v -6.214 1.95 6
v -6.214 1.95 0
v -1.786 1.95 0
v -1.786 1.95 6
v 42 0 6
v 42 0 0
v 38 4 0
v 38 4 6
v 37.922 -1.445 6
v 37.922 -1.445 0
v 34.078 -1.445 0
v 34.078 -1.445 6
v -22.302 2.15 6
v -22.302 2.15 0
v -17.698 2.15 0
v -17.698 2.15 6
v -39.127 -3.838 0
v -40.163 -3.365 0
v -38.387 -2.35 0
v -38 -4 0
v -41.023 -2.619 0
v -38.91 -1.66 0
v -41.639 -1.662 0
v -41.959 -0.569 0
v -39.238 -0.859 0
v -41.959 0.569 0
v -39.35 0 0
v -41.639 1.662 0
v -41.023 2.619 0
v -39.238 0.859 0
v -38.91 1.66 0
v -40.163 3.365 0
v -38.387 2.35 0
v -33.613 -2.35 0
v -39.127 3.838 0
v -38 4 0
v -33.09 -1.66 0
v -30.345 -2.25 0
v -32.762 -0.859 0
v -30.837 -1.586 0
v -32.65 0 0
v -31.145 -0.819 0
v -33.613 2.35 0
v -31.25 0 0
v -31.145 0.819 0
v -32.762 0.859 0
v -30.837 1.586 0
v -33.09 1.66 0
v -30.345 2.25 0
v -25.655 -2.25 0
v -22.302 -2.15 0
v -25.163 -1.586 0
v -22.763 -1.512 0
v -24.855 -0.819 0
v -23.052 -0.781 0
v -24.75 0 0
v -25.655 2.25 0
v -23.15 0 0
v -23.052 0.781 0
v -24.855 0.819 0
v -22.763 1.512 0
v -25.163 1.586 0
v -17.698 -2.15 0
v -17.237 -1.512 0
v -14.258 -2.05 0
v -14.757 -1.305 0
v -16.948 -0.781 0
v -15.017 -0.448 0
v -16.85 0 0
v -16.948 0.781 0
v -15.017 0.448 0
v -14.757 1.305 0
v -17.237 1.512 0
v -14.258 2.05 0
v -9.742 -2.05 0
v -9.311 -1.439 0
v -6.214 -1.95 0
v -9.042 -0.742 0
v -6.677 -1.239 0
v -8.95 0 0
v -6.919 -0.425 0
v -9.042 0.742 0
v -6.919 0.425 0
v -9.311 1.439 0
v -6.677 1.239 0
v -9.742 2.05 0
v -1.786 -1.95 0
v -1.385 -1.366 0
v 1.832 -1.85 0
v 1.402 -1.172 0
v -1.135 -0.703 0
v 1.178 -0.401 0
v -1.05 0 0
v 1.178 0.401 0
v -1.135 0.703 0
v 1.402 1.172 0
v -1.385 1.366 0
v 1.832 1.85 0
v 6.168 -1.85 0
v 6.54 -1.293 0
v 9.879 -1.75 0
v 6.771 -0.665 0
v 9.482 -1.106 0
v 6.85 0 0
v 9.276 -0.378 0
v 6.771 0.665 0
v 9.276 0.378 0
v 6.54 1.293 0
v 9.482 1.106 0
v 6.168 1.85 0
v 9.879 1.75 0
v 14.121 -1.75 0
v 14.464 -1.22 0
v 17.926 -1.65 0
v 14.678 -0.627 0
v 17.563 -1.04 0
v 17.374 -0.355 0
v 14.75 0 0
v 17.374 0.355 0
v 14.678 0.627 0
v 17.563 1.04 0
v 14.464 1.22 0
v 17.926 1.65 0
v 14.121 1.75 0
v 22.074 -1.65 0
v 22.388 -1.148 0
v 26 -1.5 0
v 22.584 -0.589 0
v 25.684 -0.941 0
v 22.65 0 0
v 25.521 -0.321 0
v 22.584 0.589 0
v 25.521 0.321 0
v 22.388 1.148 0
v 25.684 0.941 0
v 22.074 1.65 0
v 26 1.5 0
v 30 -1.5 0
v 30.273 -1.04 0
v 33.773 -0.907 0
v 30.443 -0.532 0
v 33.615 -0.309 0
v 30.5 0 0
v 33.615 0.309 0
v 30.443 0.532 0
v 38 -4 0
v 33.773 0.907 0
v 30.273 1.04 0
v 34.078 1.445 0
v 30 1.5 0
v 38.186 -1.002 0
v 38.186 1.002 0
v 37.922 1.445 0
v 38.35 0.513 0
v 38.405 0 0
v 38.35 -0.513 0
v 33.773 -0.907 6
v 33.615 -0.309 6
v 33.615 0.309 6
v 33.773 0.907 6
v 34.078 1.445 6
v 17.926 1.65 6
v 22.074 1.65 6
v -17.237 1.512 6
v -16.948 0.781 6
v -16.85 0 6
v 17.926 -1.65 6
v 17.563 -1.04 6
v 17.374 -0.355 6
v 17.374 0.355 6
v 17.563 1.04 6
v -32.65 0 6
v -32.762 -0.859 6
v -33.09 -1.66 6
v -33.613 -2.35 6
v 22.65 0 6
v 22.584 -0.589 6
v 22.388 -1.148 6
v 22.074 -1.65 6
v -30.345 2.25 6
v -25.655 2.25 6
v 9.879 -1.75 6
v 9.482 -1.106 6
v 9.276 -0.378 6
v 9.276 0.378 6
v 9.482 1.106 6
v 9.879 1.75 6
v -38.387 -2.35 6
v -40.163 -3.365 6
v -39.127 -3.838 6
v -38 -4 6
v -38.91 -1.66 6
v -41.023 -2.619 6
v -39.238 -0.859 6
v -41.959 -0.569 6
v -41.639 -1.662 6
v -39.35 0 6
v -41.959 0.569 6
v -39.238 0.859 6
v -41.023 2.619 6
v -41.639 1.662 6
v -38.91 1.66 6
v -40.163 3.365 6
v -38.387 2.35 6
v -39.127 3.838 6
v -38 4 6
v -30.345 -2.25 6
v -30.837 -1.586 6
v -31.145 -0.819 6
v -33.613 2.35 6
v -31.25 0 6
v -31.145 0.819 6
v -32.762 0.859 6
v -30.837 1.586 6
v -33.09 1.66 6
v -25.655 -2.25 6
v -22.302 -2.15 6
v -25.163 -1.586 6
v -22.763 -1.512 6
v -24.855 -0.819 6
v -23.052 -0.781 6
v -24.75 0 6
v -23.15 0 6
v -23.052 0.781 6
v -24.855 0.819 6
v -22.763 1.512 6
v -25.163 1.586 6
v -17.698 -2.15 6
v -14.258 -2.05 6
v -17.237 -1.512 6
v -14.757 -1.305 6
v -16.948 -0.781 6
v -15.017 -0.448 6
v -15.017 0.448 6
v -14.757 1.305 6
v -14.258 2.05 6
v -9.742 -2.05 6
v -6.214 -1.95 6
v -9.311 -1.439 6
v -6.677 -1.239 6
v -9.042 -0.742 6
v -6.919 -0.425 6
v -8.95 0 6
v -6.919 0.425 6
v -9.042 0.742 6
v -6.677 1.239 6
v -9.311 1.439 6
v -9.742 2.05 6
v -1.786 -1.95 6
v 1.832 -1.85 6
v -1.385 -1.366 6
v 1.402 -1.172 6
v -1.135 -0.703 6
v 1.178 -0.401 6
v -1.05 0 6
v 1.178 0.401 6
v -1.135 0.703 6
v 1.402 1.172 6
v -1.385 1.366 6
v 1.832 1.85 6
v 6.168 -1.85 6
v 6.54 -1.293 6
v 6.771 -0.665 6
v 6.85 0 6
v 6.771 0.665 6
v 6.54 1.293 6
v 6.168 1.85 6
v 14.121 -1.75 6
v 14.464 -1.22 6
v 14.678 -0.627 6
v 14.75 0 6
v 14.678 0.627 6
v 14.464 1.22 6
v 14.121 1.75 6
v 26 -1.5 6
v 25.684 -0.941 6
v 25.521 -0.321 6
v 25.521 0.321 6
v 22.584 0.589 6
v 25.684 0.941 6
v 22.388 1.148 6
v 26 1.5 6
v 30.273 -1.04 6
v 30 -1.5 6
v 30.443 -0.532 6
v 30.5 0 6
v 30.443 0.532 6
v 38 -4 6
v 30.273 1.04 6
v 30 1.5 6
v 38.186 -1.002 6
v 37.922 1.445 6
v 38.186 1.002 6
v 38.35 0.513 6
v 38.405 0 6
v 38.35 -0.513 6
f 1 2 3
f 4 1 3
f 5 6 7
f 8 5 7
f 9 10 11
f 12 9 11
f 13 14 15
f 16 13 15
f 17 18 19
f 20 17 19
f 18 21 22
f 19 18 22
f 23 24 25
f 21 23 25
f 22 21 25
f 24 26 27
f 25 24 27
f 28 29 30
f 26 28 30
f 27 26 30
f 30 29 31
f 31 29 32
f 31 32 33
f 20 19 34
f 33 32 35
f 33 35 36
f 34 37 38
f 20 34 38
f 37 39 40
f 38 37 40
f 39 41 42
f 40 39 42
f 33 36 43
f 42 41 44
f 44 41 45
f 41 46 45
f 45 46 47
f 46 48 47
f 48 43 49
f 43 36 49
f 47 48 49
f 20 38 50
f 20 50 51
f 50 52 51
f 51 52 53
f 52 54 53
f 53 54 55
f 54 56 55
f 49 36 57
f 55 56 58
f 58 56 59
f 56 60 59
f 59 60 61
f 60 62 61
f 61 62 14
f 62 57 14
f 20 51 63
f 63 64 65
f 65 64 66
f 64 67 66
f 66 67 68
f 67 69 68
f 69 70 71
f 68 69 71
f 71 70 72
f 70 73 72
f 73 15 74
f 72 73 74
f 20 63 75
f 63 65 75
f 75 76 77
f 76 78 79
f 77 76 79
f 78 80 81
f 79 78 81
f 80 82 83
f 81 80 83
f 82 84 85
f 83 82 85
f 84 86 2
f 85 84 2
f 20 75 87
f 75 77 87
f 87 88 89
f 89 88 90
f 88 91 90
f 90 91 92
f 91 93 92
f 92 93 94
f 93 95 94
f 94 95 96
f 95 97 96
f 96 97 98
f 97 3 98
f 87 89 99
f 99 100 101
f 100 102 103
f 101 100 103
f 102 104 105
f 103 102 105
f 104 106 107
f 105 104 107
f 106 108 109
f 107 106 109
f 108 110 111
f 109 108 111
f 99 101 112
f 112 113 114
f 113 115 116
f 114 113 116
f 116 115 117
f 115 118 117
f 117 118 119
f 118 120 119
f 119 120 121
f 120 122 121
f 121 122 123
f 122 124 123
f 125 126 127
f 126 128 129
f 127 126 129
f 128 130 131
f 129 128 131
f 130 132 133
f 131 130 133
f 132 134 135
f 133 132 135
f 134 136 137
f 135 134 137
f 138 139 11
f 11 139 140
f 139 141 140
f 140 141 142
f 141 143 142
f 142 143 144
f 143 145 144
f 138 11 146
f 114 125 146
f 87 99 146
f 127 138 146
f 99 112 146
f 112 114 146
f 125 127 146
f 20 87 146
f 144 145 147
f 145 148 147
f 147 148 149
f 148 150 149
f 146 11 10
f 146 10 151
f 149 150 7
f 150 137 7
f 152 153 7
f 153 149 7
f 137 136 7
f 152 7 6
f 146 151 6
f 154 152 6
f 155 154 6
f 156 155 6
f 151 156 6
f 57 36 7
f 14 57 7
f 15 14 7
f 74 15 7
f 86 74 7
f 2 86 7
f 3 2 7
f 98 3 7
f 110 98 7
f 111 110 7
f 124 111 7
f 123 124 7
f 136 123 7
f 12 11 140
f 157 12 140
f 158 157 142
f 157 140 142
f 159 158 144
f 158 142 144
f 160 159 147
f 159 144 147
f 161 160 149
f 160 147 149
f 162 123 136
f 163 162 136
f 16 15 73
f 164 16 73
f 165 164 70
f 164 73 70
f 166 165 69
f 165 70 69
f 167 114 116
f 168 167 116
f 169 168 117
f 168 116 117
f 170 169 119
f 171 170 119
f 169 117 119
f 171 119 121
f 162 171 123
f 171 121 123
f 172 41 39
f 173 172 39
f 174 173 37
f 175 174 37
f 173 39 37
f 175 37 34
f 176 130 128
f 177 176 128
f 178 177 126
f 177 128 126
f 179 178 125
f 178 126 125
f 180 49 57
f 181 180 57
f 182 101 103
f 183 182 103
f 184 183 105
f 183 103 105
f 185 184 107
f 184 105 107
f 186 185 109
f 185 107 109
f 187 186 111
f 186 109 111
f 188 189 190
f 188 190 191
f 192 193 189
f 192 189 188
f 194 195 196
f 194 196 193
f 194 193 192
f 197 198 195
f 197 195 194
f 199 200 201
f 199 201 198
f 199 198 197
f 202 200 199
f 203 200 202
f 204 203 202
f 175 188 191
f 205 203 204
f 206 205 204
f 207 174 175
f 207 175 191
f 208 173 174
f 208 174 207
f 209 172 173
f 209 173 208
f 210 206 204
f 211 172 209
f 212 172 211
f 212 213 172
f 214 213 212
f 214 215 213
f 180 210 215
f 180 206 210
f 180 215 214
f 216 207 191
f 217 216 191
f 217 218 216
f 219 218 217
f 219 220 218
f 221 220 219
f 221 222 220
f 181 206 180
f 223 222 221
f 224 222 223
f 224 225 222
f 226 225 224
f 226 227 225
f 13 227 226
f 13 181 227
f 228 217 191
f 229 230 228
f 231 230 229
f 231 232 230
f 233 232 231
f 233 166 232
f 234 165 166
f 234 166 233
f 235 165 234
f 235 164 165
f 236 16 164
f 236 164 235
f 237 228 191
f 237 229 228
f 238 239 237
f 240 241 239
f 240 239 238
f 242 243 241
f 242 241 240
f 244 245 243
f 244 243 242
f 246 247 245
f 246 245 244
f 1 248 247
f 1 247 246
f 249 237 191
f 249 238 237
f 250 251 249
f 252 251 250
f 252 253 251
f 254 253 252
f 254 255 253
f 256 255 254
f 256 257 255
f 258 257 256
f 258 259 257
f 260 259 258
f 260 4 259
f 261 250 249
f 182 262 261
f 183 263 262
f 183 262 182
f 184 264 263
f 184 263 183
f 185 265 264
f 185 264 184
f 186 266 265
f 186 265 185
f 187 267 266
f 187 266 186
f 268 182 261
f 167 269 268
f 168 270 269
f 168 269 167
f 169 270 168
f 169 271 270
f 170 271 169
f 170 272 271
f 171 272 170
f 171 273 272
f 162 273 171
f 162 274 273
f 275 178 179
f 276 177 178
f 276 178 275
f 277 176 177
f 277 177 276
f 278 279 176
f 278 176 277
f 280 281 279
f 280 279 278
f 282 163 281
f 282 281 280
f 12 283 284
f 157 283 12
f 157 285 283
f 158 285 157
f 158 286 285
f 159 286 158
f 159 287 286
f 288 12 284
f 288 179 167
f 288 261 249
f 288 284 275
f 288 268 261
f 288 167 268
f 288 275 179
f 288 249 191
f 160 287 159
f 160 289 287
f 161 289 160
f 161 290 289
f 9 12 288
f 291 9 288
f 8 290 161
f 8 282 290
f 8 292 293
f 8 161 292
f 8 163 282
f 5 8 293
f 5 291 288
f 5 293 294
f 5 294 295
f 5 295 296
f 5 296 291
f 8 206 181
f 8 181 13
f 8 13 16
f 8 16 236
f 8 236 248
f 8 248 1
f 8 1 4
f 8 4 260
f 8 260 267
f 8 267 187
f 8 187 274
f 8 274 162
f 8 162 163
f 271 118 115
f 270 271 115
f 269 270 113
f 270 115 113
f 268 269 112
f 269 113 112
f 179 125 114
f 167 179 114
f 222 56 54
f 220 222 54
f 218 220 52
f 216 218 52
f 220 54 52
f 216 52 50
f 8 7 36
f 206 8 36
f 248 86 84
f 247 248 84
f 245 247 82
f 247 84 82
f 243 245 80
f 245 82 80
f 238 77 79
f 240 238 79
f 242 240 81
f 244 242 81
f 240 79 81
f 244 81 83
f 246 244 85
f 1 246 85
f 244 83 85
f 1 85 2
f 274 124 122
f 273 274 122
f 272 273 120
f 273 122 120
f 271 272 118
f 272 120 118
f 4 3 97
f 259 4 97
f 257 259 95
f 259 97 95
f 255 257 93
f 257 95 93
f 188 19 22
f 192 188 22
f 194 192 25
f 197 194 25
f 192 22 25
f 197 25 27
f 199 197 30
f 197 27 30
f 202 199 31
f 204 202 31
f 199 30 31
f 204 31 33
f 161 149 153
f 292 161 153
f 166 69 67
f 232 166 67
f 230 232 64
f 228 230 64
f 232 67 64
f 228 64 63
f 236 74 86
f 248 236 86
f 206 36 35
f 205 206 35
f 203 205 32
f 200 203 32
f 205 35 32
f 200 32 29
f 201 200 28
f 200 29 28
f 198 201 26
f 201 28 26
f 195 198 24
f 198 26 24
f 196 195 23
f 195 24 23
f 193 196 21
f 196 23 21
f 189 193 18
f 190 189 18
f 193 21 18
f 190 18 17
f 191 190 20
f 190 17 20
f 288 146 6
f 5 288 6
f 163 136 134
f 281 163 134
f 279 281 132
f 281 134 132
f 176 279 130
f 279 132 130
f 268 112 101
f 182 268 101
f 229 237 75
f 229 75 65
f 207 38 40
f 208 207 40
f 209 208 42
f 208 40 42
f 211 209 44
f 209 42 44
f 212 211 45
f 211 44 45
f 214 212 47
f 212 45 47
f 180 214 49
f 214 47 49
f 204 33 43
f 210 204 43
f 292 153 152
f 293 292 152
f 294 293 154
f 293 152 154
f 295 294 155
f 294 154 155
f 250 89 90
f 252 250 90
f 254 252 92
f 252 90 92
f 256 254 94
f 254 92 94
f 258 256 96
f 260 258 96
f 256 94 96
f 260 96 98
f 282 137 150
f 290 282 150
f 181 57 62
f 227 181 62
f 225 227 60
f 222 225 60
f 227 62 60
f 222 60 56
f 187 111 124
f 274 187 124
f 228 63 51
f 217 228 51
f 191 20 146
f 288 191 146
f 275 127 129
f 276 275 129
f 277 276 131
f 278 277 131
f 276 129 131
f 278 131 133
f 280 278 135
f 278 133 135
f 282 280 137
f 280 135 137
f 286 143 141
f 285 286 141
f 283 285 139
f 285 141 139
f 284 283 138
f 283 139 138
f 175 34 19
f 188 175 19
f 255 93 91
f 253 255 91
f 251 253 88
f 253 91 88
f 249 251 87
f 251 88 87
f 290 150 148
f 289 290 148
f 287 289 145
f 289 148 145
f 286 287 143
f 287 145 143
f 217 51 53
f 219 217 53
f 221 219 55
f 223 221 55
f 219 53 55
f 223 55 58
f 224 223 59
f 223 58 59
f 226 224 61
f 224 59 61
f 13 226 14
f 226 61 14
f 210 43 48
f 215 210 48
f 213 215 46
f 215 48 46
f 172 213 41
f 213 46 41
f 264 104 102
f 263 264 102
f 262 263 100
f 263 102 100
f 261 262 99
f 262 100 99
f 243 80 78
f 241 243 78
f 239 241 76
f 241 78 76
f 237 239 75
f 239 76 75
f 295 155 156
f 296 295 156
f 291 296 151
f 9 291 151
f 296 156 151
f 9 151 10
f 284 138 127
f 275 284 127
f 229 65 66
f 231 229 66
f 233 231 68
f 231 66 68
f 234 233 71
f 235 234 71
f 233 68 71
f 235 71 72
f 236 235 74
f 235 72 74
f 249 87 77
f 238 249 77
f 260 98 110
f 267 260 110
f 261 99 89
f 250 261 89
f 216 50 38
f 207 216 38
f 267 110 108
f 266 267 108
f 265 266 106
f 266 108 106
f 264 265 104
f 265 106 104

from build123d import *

# Parameters (mm, degrees)
F1_DEPTH = 6


with BuildPart() as f1:
    # F0 (on Top) → F1 (new body)
    with BuildSketch(Plane.XY):
        with BuildLine():
            Line((38, 4), (-38, 4))
            ThreePointArc((-38, 4), (-42, 0), (-38, -4))
            Line((-38, -4), (38, -4))
            Line((38, -4), (42, 0))
            Line((42, 0), (38, 4))
        make_face()
        with BuildLine():
            ThreePointArc((-33.612533, 2.35), (-32.899958, 1.269741), (-32.65, 0))
            ThreePointArc((-32.65, 0), (-32.899958, -1.269741), (-33.612533, -2.35))
            ThreePointArc((-33.612533, -2.35), (-36, -3.35), (-38.387467, -2.35))
            ThreePointArc((-38.387467, -2.35), (-39.35, 0), (-38.387467, 2.35))
            ThreePointArc((-38.387467, 2.35), (-36, 3.35), (-33.612533, 2.35))
        make_face(mode=Mode.SUBTRACT)
        with BuildLine():
            ThreePointArc((-25.654792, 2.25), (-24.98467, 1.212554), (-24.75, 0))
            ThreePointArc((-24.75, 0), (-24.98467, -1.212554), (-25.654792, -2.25))
            ThreePointArc((-25.654792, -2.25), (-28, -3.25), (-30.345208, -2.25))
            ThreePointArc((-30.345208, -2.25), (-31.25, 0), (-30.345208, 2.25))
            ThreePointArc((-30.345208, 2.25), (-28, 3.25), (-25.654792, 2.25))
        make_face(mode=Mode.SUBTRACT)
        with BuildLine():
            ThreePointArc((-17.697827, 2.15), (-17.069612, 1.155564), (-16.85, 0))
            ThreePointArc((-16.85, 0), (-17.069612, -1.155564), (-17.697827, -2.15))
            ThreePointArc((-17.697827, -2.15), (-20, -3.15), (-22.302173, -2.15))
            ThreePointArc((-22.302173, -2.15), (-23.15, 0), (-22.302173, 2.15))
            ThreePointArc((-22.302173, 2.15), (-20, 3.15), (-17.697827, 2.15))
        make_face(mode=Mode.SUBTRACT)
        with BuildLine():
            ThreePointArc((-9.741682, 2.05), (-9.154796, 1.098779), (-8.95, 0))
            ThreePointArc((-8.95, 0), (-9.154796, -1.098779), (-9.741682, -2.05))
            ThreePointArc((-9.741682, -2.05), (-12, -3.05), (-14.258318, -2.05))
            ThreePointArc((-14.258318, -2.05), (-15.05, 0), (-14.258318, 2.05))
            ThreePointArc((-14.258318, 2.05), (-12, 3.05), (-9.741682, 2.05))
        make_face(mode=Mode.SUBTRACT)
        with BuildLine():
            ThreePointArc((-1.786406, 1.95), (-1.240235, 1.042208), (-1.05, 0))
            ThreePointArc((-1.05, 0), (-1.240235, -1.042208), (-1.786406, -1.95))
            ThreePointArc((-1.786406, -1.95), (-4, -2.95), (-6.213594, -1.95))
            ThreePointArc((-6.213594, -1.95), (-6.95, 0), (-6.213594, 1.95))
            ThreePointArc((-6.213594, 1.95), (-4, 2.95), (-1.786406, 1.95))
        make_face(mode=Mode.SUBTRACT)
        with BuildLine():
            ThreePointArc((6.167948, 1.85), (6.674056, 0.985862), (6.85, 0))
            ThreePointArc((6.85, 0), (6.674056, -0.985862), (6.167948, -1.85))
            ThreePointArc((6.167948, -1.85), (4, -2.85), (1.832052, -1.85))
            ThreePointArc((1.832052, -1.85), (1.15, 0), (1.832052, 1.85))
            ThreePointArc((1.832052, 1.85), (4, 2.85), (6.167948, 1.85))
        make_face(mode=Mode.SUBTRACT)
        with BuildLine():
            ThreePointArc((14.12132, 1.75), (14.588062, 0.92975), (14.75, 0))
            ThreePointArc((14.75, 0), (14.588062, -0.92975), (14.12132, -1.75))
            ThreePointArc((14.12132, -1.75), (12, -2.75), (9.87868, -1.75))
            ThreePointArc((9.87868, -1.75), (9.25, 0), (9.87868, 1.75))
            ThreePointArc((9.87868, 1.75), (12, 2.75), (14.12132, 1.75))
        make_face(mode=Mode.SUBTRACT)
        with BuildLine():
            ThreePointArc((22.073644, 1.65), (22.501765, 0.873883), (22.65, 0))
            ThreePointArc((22.65, 0), (22.501765, -0.873883), (22.073644, -1.65))
            ThreePointArc((22.073644, -1.65), (20, -2.65), (17.926356, -1.65))
            ThreePointArc((17.926356, -1.65), (17.35, 0), (17.926356, 1.65))
            ThreePointArc((17.926356, 1.65), (20, 2.65), (22.073644, 1.65))
        make_face(mode=Mode.SUBTRACT)
        with BuildLine():
            ThreePointArc((30, 1.5), (30.371708, 0.790569), (30.5, 0))
            ThreePointArc((30.5, 0), (30.371708, -0.790569), (30, -1.5))
            ThreePointArc((30, -1.5), (28, -2.5), (26, -1.5))
            ThreePointArc((26, -1.5), (25.5, 0), (26, 1.5))
            ThreePointArc((26, 1.5), (28, 2.5), (30, 1.5))
        make_face(mode=Mode.SUBTRACT)
        with BuildLine():
            ThreePointArc((37.922498, 1.445), (38.281188, 0.761714), (38.405, 0))
            ThreePointArc((38.405, 0), (38.281188, -0.761714), (37.922498, -1.445))
            ThreePointArc((37.922498, -1.445), (36, -2.405), (34.077502, -1.445))
            ThreePointArc((34.077502, -1.445), (33.595, 0), (34.077502, 1.445))
            ThreePointArc((34.077502, 1.445), (36, 2.405), (37.922498, 1.445))
        make_face(mode=Mode.SUBTRACT)
        with BuildLine():
            Line((-38.387467, 2.35), (-33.612533, 2.35))
            ThreePointArc((-33.612533, 2.35), (-36, 3.35), (-38.387467, 2.35))
        make_face()
        with BuildLine():
            ThreePointArc((-38.387467, -2.35), (-36, -3.35), (-33.612533, -2.35))
            Line((-33.612533, -2.35), (-38.387467, -2.35))
        make_face()
        with BuildLine():
            Line((-30.345208, 2.25), (-25.654792, 2.25))
            ThreePointArc((-25.654792, 2.25), (-28, 3.25), (-30.345208, 2.25))
        make_face()
        with BuildLine():
            ThreePointArc((-30.345208, -2.25), (-28, -3.25), (-25.654792, -2.25))
            Line((-25.654792, -2.25), (-30.345208, -2.25))
        make_face()
        with BuildLine():
            Line((-22.302173, 2.15), (-17.697827, 2.15))
            ThreePointArc((-17.697827, 2.15), (-20, 3.15), (-22.302173, 2.15))
        make_face()
        with BuildLine():
            ThreePointArc((-22.302173, -2.15), (-20, -3.15), (-17.697827, -2.15))
            Line((-17.697827, -2.15), (-22.302173, -2.15))
        make_face()
        with BuildLine():
            Line((-14.258318, 2.05), (-9.741682, 2.05))
            ThreePointArc((-9.741682, 2.05), (-12, 3.05), (-14.258318, 2.05))
        make_face()
        with BuildLine():
            ThreePointArc((-14.258318, -2.05), (-12, -3.05), (-9.741682, -2.05))
            Line((-9.741682, -2.05), (-14.258318, -2.05))
        make_face()
        with BuildLine():
            Line((-6.213594, 1.95), (-1.786406, 1.95))
            ThreePointArc((-1.786406, 1.95), (-4, 2.95), (-6.213594, 1.95))
        make_face()
        with BuildLine():
            ThreePointArc((-6.213594, -1.95), (-4, -2.95), (-1.786406, -1.95))
            Line((-1.786406, -1.95), (-6.213594, -1.95))
        make_face()
        with BuildLine():
            Line((1.832052, 1.85), (6.167948, 1.85))
            ThreePointArc((6.167948, 1.85), (4, 2.85), (1.832052, 1.85))
        make_face()
        with BuildLine():
            ThreePointArc((1.832052, -1.85), (4, -2.85), (6.167948, -1.85))
            Line((6.167948, -1.85), (1.832052, -1.85))
        make_face()
        with BuildLine():
            Line((9.87868, 1.75), (14.12132, 1.75))
            ThreePointArc((14.12132, 1.75), (12, 2.75), (9.87868, 1.75))
        make_face()
        with BuildLine():
            ThreePointArc((9.87868, -1.75), (12, -2.75), (14.12132, -1.75))
            Line((14.12132, -1.75), (9.87868, -1.75))
        make_face()
        with BuildLine():
            Line((17.926356, 1.65), (22.073644, 1.65))
            ThreePointArc((22.073644, 1.65), (20, 2.65), (17.926356, 1.65))
        make_face()
        with BuildLine():
            ThreePointArc((17.926356, -1.65), (20, -2.65), (22.073644, -1.65))
            Line((22.073644, -1.65), (17.926356, -1.65))
        make_face()
        with BuildLine():
            Line((26, 1.5), (30, 1.5))
            ThreePointArc((30, 1.5), (28, 2.5), (26, 1.5))
        make_face()
        with BuildLine():
            ThreePointArc((26, -1.5), (28, -2.5), (30, -1.5))
            Line((30, -1.5), (26, -1.5))
        make_face()
        with BuildLine():
            Line((34.077502, 1.445), (37.922498, 1.445))
            ThreePointArc((37.922498, 1.445), (36, 2.405), (34.077502, 1.445))
        make_face()
        with BuildLine():
            ThreePointArc((34.077502, -1.445), (36, -2.405), (37.922498, -1.445))
            Line((37.922498, -1.445), (34.077502, -1.445))
        make_face()
    extrude(amount=F1_DEPTH)


solid = f1.part
